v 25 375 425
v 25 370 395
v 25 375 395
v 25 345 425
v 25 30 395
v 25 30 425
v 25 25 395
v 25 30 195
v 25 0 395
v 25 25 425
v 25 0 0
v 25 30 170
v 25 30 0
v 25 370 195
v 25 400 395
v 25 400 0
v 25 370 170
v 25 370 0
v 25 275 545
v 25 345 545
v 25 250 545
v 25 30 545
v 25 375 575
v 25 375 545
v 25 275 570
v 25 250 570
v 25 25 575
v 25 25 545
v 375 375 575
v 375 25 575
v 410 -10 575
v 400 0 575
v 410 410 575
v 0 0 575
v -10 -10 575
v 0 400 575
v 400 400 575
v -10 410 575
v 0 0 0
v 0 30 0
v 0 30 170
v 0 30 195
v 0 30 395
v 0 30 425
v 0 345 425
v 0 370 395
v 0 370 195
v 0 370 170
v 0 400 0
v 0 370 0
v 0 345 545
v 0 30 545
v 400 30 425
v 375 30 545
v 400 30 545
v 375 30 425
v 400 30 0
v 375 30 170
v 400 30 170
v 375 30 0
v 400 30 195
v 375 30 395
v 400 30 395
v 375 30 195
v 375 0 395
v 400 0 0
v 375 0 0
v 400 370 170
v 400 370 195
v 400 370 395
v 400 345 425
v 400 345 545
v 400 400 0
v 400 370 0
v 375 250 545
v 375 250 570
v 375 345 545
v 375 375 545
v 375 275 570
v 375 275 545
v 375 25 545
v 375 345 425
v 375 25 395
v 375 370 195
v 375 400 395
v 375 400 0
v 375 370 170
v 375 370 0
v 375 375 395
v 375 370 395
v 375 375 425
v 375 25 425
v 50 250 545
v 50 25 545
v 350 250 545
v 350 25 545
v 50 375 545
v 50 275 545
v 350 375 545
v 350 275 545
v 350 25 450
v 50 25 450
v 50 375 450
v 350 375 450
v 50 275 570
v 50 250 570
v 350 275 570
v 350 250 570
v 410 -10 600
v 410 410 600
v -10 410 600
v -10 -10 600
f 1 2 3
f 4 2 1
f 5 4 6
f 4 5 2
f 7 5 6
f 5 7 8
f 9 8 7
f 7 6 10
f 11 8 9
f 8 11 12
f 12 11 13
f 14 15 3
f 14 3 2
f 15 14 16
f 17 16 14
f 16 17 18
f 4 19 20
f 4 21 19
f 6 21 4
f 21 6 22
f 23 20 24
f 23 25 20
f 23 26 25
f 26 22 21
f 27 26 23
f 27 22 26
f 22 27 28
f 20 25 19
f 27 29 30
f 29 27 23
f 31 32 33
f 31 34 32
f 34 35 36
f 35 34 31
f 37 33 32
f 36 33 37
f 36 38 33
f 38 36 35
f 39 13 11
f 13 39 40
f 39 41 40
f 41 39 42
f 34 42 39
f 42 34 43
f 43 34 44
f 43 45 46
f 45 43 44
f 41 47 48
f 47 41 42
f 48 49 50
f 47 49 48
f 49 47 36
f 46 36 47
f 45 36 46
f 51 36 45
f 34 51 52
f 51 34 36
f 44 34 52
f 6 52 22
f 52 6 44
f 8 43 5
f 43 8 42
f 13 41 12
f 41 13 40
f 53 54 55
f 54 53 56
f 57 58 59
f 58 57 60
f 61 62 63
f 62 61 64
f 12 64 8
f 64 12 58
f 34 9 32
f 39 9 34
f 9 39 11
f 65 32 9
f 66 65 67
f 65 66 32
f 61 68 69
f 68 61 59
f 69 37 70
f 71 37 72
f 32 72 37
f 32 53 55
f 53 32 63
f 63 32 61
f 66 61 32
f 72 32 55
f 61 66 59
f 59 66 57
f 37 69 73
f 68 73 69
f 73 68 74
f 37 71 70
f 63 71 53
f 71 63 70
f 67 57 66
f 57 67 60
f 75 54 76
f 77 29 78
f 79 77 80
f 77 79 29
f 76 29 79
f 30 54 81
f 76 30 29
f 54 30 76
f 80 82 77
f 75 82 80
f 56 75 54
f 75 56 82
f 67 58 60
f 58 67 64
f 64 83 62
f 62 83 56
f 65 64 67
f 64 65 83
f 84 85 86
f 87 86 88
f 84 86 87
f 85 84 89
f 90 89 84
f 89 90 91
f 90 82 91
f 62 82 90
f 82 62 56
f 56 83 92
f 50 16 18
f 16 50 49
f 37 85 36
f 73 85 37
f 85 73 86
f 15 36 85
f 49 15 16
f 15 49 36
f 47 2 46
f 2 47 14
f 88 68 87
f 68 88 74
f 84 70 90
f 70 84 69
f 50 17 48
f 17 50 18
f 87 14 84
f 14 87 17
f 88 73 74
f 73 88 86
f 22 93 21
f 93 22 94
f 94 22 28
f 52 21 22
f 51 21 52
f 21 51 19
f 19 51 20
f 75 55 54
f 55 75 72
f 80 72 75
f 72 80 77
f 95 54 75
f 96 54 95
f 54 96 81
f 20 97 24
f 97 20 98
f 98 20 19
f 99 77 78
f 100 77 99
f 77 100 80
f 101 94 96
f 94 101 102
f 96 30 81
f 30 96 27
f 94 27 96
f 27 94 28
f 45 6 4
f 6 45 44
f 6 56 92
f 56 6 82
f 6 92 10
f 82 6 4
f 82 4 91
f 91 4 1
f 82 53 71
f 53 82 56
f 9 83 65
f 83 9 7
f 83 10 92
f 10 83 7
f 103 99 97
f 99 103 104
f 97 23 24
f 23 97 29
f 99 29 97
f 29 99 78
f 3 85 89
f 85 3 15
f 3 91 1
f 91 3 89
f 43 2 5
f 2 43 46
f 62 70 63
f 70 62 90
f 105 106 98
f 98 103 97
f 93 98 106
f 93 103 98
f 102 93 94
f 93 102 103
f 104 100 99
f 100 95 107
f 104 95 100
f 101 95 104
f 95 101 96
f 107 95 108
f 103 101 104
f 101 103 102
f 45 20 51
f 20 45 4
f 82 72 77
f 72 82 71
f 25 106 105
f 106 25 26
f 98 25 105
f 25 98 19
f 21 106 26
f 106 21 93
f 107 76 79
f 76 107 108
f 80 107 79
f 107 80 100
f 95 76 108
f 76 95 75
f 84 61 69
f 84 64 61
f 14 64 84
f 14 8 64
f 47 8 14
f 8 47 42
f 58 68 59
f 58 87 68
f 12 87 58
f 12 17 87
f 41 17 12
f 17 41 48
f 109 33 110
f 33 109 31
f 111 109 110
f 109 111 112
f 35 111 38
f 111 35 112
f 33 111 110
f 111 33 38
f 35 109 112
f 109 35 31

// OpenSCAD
/*

    Nightstand
    
    By Anton Augustsson
    
    
*/



/*
    ---------- Variables ---------- 
*/

thickness = 25; // Ash

totalHeight = 600;  
totalWidth  = 420;
totalDepth  = 420;

extraWidth = 10;  // Each side 
extraDepth = 10;  // Each side

legWidth     = 30; 
legLength    = totalHeight-thickness;
legThickness = thickness;

tenonWidth     = thickness;
tenonLengthX   = totalWidth-extraWidth*2; 
tenonLengthY   = totalDepth-extraDepth*2-legWidth*2; 
tenonThickness = legWidth;

boxHeight = 120;
boxWidth  = totalWidth-extraWidth*2-legThickness*2;
boxDepth  = totalDepth-extraDepth*2-thickness*2;
boxBottomWidth = boxWidth-thickness*2;

shelfPositionHeight = 140;
shelfWidth = tenonThickness;



/* 
    ---------- Code ----------
*/



// ---------- Leg ----------

color("Wheat")
union(){
         
// leg 1
translate([
    0,
    0,
    0]) 
cube(size = [
    legThickness,
    legWidth,
    legLength]);
    
// leg 2
translate([
    tenonLengthX-legThickness,
    0,
    0]) 
cube(size = [
    legThickness,
    legWidth,
    legLength]);
    
// leg 3
translate([
    0,
    tenonLengthY+legWidth,
    0]) 
cube(size = [
    legThickness,
    legWidth,
    legLength]);
    
// leg 4
translate([
    tenonLengthX-legThickness,
    tenonLengthY+legWidth,
    0]) 
cube(size = [
    legThickness,
    legWidth,
    legLength]);
    

// ---------- Tenons ----------

// front upper tenon
translate([
    0,
    0,
    legLength-tenonThickness]) 
cube(size = [
    tenonLengthX,
    tenonWidth,
    tenonThickness]);
    
// front lower tenon
translate([
    0,
    0,
    legLength-tenonThickness*2-boxHeight]) 
cube(size = [
    tenonLengthX,
    tenonWidth,
    tenonThickness]);
     
// back upper tenon
translate([
    0,
    tenonLengthY+legWidth*2-tenonWidth,
    legLength-tenonThickness]) 
cube(size = [
    tenonLengthX,
    tenonWidth,
    tenonThickness]);
    
// back lower tenon
translate([
    0,
    tenonLengthY+legWidth*2-tenonWidth,
    legLength-tenonThickness*2-boxHeight]) 
cube(size = [
    tenonLengthX,
    tenonWidth,
    tenonThickness]);

// left upper tenon
translate([
    0,
    legWidth,
    legLength-tenonThickness]) 
cube(size = [
    tenonWidth,
    tenonLengthY,
    tenonThickness]);

// left lower tenon
translate([
    0,
    legWidth,
    legLength-tenonThickness*2-boxHeight]) 
cube(size = [
    tenonWidth,
    tenonLengthY,
    tenonThickness]);

// right upper tenon
translate([
    tenonLengthX-legThickness,
    legWidth,
    legLength-tenonThickness]) 
cube(size = [
    tenonWidth,
    tenonLengthY,
    tenonThickness]);

// right lower tenon
translate([
    tenonLengthX-legThickness,
    legWidth,
    legLength-tenonThickness*2-boxHeight]) 
cube(size = [
    tenonWidth,
    tenonLengthY,
    tenonThickness]);
    
}


/* 
  ---------- Shelf ----------
*/

color("tan")
// Shelf
translate([
    0,
    legWidth,
    shelfPositionHeight+tenonThickness]) 
cube(size = [
    tenonLengthX,
    tenonLengthY,
    thickness]);


/* 
  ---------- Box ----------
*/

color("tan")
union(){ 
// Box Front
translate([
    legThickness,
    0,
    legLength-boxHeight-tenonThickness]) 
cube(size = [
    boxWidth,
    thickness,
    boxHeight]);
    
// Box Back
translate([
    legThickness,
    tenonLengthY+legWidth*2-thickness,
    legLength-boxHeight-tenonThickness]) 
cube(size = [
    boxWidth,
    thickness,
    boxHeight]);
    
// Box Left side
translate([
    legThickness,
    thickness,
    legLength-boxHeight-tenonThickness]) 
cube(size = [
    thickness,
    boxDepth,
    boxHeight]);
    
// Box Right side
translate([
    legThickness+boxWidth-thickness,
    thickness,
    legLength-boxHeight-tenonThickness]) 
cube(size = [
    thickness,
    boxDepth,
    boxHeight]);
    
// Box Bottom
translate([
    legThickness+thickness,
    thickness,
    legLength-boxHeight-tenonThickness]) 
cube(size = [
    boxBottomWidth,
    boxDepth,
    thickness]);

// Box left side stop
translate([
    0,
    legWidth+tenonLengthY-thickness,
    legLength-boxHeight-tenonThickness]) 
cube(size = [
    thickness,
    thickness,
    boxHeight]);
    
// Box Right side stop
translate([
    legThickness+boxWidth,
    legWidth+tenonLengthY-thickness,
    legLength-boxHeight-tenonThickness]) 
cube(size = [
    thickness,
    thickness,
    boxHeight]);
 
// Box Top Left 
translate([
    tenonWidth,
    250,
    legLength-boxHeight-tenonThickness+boxHeight]) 
cube(size = [
    thickness,
    thickness,
    thickness]);
    
// Box Top Right 
translate([
    legThickness+boxWidth-thickness,
    250,
    legLength-boxHeight-tenonThickness+boxHeight]) 
cube(size = [
    thickness,
    thickness,
    thickness]);
}


 
//  ---------- Top ----------


color("tan")
translate([
    -extraWidth,
    -extraDepth,
    totalHeight-thickness]) 
cube(size = [
    totalWidth,
    totalDepth,
    thickness]);
